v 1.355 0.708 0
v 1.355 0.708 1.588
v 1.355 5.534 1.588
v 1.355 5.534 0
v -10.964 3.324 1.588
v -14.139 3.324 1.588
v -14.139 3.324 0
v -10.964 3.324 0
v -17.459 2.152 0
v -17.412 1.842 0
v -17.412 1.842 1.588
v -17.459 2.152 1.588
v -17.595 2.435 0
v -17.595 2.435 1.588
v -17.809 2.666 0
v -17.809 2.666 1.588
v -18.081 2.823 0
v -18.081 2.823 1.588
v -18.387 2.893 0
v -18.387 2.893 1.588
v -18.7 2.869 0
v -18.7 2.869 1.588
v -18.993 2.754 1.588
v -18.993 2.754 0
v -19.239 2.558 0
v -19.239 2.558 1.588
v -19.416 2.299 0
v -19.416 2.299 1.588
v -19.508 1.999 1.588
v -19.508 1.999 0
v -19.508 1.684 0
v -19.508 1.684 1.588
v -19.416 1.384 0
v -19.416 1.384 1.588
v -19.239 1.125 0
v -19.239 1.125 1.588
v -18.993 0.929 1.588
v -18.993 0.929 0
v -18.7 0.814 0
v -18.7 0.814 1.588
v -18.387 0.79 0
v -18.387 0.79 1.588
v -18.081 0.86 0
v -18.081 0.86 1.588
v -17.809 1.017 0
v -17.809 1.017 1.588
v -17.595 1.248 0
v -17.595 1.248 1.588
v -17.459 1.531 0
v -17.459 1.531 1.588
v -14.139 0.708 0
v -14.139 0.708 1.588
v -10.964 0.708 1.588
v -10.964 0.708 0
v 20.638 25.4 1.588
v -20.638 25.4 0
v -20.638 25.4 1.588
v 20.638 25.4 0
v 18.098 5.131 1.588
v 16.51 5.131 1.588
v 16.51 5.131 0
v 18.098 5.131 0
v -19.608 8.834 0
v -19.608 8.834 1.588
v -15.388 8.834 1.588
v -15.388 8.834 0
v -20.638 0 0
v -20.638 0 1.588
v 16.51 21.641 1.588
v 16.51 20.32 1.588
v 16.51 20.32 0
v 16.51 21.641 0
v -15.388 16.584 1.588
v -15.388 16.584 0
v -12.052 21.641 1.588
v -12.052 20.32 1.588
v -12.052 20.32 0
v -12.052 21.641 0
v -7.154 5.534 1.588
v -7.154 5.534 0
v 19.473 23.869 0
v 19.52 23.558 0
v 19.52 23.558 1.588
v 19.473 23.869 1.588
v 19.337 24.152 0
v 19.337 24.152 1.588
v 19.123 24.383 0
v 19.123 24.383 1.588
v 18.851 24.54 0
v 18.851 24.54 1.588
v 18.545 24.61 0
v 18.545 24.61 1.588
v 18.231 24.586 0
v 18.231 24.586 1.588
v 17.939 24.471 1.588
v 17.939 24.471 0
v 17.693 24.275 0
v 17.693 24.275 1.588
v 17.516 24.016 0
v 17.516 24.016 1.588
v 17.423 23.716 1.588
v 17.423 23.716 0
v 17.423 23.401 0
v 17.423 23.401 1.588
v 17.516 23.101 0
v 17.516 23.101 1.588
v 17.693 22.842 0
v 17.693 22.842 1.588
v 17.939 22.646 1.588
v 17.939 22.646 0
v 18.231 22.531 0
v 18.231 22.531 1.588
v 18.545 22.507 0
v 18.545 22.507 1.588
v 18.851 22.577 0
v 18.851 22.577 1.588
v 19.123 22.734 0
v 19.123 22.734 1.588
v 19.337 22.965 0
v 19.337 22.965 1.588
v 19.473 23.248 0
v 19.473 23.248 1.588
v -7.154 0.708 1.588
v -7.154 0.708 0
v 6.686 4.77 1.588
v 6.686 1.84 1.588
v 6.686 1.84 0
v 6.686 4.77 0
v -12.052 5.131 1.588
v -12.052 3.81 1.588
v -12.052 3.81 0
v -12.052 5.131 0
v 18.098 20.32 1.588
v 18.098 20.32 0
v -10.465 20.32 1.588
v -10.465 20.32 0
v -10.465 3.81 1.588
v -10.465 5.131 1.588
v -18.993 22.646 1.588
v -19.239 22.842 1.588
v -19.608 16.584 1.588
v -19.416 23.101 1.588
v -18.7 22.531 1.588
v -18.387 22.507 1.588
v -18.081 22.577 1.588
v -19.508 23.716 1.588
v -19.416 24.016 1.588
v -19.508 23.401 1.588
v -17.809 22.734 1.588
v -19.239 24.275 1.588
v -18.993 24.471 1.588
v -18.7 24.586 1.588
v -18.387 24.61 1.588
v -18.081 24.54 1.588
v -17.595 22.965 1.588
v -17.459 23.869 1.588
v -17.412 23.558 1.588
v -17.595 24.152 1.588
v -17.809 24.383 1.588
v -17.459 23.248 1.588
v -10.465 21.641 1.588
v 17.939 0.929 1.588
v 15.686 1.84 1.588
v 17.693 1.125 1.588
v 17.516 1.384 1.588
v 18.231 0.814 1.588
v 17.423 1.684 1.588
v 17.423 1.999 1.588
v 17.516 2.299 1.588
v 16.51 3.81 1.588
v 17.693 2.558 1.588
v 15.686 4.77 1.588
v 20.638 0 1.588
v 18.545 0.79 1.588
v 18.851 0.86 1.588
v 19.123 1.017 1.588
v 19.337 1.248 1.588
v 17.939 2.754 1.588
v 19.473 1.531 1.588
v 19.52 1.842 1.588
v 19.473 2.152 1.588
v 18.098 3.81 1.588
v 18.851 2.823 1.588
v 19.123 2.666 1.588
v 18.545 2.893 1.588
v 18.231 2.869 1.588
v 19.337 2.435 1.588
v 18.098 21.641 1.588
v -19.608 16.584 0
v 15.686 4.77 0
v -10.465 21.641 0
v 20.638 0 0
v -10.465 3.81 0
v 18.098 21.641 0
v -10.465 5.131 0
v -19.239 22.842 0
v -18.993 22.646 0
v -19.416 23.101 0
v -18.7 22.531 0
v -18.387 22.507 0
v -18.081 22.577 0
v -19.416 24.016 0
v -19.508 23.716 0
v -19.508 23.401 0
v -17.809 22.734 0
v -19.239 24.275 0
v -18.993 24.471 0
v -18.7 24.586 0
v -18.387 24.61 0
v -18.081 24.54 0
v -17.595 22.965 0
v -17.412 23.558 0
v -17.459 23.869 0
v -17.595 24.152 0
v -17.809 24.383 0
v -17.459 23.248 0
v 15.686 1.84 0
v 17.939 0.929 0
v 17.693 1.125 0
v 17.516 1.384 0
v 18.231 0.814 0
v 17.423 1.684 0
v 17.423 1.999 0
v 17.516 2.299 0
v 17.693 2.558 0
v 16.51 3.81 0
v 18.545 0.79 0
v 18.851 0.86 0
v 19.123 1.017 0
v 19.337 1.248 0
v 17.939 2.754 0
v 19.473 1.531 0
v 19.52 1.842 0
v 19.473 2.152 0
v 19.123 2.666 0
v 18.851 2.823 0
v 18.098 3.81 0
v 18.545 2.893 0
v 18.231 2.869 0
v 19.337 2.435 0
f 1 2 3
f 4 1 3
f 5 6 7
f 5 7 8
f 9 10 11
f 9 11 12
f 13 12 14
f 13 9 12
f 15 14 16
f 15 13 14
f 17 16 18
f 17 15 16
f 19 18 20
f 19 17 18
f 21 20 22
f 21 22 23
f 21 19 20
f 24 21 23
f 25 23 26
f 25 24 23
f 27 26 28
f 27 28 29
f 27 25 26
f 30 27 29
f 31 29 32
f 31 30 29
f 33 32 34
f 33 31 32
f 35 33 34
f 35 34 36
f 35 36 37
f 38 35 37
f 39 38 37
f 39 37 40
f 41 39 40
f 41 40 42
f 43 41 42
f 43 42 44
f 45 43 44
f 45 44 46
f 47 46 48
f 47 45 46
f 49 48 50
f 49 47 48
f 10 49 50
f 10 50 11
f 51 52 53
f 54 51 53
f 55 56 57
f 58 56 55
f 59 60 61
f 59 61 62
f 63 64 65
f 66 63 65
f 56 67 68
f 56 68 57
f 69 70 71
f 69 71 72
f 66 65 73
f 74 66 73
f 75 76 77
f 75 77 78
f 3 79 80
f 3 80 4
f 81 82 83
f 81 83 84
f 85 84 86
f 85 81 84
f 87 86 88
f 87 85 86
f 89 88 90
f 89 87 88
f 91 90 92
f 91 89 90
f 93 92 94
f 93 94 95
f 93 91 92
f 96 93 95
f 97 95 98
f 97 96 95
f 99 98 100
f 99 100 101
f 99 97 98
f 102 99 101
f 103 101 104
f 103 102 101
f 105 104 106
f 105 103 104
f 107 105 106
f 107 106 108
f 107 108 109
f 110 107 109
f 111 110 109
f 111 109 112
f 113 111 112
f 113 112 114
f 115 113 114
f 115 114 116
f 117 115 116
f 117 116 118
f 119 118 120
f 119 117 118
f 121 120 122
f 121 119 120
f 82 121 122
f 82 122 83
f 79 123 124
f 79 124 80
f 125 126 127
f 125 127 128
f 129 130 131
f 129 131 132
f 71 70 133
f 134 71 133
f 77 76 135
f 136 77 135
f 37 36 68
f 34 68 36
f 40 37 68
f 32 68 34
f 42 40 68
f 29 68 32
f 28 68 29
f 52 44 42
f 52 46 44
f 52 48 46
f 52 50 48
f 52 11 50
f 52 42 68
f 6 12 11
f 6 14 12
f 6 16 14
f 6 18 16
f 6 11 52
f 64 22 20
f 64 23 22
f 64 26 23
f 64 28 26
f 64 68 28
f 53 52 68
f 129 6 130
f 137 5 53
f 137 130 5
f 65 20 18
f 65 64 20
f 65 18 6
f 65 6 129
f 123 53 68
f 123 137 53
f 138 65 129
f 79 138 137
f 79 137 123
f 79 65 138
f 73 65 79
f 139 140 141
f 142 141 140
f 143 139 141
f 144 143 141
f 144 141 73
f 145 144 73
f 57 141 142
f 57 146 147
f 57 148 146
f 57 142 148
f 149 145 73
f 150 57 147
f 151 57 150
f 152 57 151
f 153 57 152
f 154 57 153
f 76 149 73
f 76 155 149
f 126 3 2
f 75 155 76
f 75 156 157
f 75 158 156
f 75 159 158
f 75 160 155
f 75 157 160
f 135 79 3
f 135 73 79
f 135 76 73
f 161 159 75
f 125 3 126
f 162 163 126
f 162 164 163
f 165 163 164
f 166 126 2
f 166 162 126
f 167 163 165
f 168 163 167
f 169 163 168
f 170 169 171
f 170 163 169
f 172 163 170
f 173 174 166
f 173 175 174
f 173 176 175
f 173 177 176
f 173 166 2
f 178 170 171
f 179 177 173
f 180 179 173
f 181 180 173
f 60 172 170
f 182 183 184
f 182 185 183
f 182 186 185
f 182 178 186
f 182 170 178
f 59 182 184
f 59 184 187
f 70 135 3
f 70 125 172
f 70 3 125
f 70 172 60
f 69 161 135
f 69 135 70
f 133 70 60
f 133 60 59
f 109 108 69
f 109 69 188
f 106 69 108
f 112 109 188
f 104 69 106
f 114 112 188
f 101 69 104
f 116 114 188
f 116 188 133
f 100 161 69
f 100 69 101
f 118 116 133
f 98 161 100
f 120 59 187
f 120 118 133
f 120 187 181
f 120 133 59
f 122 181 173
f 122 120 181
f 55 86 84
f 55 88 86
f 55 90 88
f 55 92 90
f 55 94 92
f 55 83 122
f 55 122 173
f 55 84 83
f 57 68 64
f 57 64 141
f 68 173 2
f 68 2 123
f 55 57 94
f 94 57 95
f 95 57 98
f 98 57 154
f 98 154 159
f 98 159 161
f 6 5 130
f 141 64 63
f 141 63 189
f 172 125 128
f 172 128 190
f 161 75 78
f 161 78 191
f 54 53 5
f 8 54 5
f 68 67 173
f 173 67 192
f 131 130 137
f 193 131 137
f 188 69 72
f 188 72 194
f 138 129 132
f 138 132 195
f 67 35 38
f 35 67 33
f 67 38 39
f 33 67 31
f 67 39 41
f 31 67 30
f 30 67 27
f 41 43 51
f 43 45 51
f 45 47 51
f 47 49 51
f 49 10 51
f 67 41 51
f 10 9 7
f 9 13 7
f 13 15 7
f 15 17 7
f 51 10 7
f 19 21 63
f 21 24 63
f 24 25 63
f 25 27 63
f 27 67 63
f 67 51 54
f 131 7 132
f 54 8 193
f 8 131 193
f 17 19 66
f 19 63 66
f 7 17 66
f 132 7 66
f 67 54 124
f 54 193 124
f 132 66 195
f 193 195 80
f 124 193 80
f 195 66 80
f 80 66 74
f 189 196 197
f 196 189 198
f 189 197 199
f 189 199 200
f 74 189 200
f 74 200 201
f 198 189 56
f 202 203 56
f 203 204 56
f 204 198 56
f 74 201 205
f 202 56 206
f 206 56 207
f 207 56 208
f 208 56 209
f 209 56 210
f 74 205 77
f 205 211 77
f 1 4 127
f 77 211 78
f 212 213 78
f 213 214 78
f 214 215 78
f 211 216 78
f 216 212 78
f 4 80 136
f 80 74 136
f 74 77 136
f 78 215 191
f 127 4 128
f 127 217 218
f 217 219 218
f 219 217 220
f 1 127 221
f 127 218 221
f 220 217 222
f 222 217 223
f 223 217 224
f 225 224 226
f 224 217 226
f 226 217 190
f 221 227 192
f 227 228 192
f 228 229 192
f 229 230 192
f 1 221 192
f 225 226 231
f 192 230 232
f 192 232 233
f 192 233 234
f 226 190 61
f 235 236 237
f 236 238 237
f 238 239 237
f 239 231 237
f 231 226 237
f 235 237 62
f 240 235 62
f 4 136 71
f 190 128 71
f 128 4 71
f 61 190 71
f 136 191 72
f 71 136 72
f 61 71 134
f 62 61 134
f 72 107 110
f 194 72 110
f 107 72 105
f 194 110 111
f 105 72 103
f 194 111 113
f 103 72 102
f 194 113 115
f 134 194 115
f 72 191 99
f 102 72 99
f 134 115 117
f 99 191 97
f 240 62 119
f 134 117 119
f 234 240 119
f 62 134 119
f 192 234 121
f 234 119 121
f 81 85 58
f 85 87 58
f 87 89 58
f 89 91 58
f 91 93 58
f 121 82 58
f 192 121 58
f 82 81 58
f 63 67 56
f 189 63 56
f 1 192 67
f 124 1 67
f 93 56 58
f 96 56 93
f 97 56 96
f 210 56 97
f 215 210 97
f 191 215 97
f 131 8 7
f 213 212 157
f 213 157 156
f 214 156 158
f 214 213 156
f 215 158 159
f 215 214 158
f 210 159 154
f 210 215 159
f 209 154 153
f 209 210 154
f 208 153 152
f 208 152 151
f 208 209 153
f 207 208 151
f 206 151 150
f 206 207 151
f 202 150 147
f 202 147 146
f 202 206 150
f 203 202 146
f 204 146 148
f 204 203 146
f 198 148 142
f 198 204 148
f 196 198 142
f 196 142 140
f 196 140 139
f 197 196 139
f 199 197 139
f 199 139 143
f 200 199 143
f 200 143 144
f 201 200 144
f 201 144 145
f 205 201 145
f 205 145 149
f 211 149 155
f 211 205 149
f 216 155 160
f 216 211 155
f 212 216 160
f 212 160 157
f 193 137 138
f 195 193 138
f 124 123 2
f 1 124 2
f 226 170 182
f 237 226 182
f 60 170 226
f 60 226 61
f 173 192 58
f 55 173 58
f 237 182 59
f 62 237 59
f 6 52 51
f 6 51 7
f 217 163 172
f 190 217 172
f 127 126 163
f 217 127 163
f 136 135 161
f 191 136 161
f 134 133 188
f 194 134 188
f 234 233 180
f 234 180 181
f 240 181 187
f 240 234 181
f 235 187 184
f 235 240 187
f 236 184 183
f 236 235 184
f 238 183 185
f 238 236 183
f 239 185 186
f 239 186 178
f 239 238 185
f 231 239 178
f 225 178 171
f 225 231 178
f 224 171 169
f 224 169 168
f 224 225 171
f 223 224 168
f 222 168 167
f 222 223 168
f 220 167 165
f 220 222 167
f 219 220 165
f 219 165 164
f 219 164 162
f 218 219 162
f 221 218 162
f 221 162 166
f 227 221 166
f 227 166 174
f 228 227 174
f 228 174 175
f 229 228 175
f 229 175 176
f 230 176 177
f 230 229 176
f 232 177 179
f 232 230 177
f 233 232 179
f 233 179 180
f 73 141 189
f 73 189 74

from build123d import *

# Parameters (mm, degrees)
SKETCH1_W           = 41.275
SKETCH1_H           = 25.4
SKETCH1_R           = 1.0541
BOSS_EXTRUDE1_DEPTH = 1.5875
SKETCH2_W           = 9
SKETCH2_H           = 2.93
SKETCH2_W_2         = 8.509
SKETCH2_H_2         = 4.826
SKETCH2_W_3         = 3.175
SKETCH2_H_3         = 2.6162
SKETCH2_W_4         = 4.22
SKETCH2_H_4         = 7.75
SKETCH2_W_5         = 1.5875
SKETCH2_H_5         = 1.3208
CUT_EXTRUDE1_DEPTH  = 1.5875


with BuildPart() as part:
    # Sketch1 → Boss-Extrude1 (new body)
    with BuildSketch(Plane.XY):
        with Locations((0, 12.7)):
            Rectangle(SKETCH1_W, SKETCH1_H)
        with Locations((-18.4658, 23.5585)):
            Circle(SKETCH1_R, mode=Mode.SUBTRACT)
        with Locations((-18.4658, 1.8415)):
            Circle(SKETCH1_R, mode=Mode.SUBTRACT)
        with Locations((18.4658, 1.8415)):
            Circle(SKETCH1_R, mode=Mode.SUBTRACT)
        with Locations((18.4658, 23.5585)):
            Circle(SKETCH1_R, mode=Mode.SUBTRACT)
    extrude(amount=BOSS_EXTRUDE1_DEPTH)

    # Sketch2 → Cut-Extrude1 (cut)
    with BuildSketch(Plane.XY.offset(1.5875)):
        with Locations((11.1858, 3.3045)):
            Rectangle(SKETCH2_W, SKETCH2_H)
        with Locations((-2.8993, 3.1205)):
            Rectangle(SKETCH2_W_2, SKETCH2_H_2)
        with Locations((-12.5513, 2.0156)):
            Rectangle(SKETCH2_W_3, SKETCH2_H_3)
        with Locations((-17.4978, 12.709)):
            Rectangle(SKETCH2_W_4, SKETCH2_H_4)
        with Locations((17.30375, 20.9804)):
            Rectangle(SKETCH2_W_5, SKETCH2_H_5)
        with Locations((17.30375, 4.4704)):
            Rectangle(SKETCH2_W_5, SKETCH2_H_5)
        with Locations((-11.25855, 4.4704)):
            Rectangle(SKETCH2_W_5, SKETCH2_H_5)
        with Locations((-11.25855, 20.9804)):
            Rectangle(SKETCH2_W_5, SKETCH2_H_5)
    extrude(amount=-CUT_EXTRUDE1_DEPTH, mode=Mode.SUBTRACT)


solid = part.part
